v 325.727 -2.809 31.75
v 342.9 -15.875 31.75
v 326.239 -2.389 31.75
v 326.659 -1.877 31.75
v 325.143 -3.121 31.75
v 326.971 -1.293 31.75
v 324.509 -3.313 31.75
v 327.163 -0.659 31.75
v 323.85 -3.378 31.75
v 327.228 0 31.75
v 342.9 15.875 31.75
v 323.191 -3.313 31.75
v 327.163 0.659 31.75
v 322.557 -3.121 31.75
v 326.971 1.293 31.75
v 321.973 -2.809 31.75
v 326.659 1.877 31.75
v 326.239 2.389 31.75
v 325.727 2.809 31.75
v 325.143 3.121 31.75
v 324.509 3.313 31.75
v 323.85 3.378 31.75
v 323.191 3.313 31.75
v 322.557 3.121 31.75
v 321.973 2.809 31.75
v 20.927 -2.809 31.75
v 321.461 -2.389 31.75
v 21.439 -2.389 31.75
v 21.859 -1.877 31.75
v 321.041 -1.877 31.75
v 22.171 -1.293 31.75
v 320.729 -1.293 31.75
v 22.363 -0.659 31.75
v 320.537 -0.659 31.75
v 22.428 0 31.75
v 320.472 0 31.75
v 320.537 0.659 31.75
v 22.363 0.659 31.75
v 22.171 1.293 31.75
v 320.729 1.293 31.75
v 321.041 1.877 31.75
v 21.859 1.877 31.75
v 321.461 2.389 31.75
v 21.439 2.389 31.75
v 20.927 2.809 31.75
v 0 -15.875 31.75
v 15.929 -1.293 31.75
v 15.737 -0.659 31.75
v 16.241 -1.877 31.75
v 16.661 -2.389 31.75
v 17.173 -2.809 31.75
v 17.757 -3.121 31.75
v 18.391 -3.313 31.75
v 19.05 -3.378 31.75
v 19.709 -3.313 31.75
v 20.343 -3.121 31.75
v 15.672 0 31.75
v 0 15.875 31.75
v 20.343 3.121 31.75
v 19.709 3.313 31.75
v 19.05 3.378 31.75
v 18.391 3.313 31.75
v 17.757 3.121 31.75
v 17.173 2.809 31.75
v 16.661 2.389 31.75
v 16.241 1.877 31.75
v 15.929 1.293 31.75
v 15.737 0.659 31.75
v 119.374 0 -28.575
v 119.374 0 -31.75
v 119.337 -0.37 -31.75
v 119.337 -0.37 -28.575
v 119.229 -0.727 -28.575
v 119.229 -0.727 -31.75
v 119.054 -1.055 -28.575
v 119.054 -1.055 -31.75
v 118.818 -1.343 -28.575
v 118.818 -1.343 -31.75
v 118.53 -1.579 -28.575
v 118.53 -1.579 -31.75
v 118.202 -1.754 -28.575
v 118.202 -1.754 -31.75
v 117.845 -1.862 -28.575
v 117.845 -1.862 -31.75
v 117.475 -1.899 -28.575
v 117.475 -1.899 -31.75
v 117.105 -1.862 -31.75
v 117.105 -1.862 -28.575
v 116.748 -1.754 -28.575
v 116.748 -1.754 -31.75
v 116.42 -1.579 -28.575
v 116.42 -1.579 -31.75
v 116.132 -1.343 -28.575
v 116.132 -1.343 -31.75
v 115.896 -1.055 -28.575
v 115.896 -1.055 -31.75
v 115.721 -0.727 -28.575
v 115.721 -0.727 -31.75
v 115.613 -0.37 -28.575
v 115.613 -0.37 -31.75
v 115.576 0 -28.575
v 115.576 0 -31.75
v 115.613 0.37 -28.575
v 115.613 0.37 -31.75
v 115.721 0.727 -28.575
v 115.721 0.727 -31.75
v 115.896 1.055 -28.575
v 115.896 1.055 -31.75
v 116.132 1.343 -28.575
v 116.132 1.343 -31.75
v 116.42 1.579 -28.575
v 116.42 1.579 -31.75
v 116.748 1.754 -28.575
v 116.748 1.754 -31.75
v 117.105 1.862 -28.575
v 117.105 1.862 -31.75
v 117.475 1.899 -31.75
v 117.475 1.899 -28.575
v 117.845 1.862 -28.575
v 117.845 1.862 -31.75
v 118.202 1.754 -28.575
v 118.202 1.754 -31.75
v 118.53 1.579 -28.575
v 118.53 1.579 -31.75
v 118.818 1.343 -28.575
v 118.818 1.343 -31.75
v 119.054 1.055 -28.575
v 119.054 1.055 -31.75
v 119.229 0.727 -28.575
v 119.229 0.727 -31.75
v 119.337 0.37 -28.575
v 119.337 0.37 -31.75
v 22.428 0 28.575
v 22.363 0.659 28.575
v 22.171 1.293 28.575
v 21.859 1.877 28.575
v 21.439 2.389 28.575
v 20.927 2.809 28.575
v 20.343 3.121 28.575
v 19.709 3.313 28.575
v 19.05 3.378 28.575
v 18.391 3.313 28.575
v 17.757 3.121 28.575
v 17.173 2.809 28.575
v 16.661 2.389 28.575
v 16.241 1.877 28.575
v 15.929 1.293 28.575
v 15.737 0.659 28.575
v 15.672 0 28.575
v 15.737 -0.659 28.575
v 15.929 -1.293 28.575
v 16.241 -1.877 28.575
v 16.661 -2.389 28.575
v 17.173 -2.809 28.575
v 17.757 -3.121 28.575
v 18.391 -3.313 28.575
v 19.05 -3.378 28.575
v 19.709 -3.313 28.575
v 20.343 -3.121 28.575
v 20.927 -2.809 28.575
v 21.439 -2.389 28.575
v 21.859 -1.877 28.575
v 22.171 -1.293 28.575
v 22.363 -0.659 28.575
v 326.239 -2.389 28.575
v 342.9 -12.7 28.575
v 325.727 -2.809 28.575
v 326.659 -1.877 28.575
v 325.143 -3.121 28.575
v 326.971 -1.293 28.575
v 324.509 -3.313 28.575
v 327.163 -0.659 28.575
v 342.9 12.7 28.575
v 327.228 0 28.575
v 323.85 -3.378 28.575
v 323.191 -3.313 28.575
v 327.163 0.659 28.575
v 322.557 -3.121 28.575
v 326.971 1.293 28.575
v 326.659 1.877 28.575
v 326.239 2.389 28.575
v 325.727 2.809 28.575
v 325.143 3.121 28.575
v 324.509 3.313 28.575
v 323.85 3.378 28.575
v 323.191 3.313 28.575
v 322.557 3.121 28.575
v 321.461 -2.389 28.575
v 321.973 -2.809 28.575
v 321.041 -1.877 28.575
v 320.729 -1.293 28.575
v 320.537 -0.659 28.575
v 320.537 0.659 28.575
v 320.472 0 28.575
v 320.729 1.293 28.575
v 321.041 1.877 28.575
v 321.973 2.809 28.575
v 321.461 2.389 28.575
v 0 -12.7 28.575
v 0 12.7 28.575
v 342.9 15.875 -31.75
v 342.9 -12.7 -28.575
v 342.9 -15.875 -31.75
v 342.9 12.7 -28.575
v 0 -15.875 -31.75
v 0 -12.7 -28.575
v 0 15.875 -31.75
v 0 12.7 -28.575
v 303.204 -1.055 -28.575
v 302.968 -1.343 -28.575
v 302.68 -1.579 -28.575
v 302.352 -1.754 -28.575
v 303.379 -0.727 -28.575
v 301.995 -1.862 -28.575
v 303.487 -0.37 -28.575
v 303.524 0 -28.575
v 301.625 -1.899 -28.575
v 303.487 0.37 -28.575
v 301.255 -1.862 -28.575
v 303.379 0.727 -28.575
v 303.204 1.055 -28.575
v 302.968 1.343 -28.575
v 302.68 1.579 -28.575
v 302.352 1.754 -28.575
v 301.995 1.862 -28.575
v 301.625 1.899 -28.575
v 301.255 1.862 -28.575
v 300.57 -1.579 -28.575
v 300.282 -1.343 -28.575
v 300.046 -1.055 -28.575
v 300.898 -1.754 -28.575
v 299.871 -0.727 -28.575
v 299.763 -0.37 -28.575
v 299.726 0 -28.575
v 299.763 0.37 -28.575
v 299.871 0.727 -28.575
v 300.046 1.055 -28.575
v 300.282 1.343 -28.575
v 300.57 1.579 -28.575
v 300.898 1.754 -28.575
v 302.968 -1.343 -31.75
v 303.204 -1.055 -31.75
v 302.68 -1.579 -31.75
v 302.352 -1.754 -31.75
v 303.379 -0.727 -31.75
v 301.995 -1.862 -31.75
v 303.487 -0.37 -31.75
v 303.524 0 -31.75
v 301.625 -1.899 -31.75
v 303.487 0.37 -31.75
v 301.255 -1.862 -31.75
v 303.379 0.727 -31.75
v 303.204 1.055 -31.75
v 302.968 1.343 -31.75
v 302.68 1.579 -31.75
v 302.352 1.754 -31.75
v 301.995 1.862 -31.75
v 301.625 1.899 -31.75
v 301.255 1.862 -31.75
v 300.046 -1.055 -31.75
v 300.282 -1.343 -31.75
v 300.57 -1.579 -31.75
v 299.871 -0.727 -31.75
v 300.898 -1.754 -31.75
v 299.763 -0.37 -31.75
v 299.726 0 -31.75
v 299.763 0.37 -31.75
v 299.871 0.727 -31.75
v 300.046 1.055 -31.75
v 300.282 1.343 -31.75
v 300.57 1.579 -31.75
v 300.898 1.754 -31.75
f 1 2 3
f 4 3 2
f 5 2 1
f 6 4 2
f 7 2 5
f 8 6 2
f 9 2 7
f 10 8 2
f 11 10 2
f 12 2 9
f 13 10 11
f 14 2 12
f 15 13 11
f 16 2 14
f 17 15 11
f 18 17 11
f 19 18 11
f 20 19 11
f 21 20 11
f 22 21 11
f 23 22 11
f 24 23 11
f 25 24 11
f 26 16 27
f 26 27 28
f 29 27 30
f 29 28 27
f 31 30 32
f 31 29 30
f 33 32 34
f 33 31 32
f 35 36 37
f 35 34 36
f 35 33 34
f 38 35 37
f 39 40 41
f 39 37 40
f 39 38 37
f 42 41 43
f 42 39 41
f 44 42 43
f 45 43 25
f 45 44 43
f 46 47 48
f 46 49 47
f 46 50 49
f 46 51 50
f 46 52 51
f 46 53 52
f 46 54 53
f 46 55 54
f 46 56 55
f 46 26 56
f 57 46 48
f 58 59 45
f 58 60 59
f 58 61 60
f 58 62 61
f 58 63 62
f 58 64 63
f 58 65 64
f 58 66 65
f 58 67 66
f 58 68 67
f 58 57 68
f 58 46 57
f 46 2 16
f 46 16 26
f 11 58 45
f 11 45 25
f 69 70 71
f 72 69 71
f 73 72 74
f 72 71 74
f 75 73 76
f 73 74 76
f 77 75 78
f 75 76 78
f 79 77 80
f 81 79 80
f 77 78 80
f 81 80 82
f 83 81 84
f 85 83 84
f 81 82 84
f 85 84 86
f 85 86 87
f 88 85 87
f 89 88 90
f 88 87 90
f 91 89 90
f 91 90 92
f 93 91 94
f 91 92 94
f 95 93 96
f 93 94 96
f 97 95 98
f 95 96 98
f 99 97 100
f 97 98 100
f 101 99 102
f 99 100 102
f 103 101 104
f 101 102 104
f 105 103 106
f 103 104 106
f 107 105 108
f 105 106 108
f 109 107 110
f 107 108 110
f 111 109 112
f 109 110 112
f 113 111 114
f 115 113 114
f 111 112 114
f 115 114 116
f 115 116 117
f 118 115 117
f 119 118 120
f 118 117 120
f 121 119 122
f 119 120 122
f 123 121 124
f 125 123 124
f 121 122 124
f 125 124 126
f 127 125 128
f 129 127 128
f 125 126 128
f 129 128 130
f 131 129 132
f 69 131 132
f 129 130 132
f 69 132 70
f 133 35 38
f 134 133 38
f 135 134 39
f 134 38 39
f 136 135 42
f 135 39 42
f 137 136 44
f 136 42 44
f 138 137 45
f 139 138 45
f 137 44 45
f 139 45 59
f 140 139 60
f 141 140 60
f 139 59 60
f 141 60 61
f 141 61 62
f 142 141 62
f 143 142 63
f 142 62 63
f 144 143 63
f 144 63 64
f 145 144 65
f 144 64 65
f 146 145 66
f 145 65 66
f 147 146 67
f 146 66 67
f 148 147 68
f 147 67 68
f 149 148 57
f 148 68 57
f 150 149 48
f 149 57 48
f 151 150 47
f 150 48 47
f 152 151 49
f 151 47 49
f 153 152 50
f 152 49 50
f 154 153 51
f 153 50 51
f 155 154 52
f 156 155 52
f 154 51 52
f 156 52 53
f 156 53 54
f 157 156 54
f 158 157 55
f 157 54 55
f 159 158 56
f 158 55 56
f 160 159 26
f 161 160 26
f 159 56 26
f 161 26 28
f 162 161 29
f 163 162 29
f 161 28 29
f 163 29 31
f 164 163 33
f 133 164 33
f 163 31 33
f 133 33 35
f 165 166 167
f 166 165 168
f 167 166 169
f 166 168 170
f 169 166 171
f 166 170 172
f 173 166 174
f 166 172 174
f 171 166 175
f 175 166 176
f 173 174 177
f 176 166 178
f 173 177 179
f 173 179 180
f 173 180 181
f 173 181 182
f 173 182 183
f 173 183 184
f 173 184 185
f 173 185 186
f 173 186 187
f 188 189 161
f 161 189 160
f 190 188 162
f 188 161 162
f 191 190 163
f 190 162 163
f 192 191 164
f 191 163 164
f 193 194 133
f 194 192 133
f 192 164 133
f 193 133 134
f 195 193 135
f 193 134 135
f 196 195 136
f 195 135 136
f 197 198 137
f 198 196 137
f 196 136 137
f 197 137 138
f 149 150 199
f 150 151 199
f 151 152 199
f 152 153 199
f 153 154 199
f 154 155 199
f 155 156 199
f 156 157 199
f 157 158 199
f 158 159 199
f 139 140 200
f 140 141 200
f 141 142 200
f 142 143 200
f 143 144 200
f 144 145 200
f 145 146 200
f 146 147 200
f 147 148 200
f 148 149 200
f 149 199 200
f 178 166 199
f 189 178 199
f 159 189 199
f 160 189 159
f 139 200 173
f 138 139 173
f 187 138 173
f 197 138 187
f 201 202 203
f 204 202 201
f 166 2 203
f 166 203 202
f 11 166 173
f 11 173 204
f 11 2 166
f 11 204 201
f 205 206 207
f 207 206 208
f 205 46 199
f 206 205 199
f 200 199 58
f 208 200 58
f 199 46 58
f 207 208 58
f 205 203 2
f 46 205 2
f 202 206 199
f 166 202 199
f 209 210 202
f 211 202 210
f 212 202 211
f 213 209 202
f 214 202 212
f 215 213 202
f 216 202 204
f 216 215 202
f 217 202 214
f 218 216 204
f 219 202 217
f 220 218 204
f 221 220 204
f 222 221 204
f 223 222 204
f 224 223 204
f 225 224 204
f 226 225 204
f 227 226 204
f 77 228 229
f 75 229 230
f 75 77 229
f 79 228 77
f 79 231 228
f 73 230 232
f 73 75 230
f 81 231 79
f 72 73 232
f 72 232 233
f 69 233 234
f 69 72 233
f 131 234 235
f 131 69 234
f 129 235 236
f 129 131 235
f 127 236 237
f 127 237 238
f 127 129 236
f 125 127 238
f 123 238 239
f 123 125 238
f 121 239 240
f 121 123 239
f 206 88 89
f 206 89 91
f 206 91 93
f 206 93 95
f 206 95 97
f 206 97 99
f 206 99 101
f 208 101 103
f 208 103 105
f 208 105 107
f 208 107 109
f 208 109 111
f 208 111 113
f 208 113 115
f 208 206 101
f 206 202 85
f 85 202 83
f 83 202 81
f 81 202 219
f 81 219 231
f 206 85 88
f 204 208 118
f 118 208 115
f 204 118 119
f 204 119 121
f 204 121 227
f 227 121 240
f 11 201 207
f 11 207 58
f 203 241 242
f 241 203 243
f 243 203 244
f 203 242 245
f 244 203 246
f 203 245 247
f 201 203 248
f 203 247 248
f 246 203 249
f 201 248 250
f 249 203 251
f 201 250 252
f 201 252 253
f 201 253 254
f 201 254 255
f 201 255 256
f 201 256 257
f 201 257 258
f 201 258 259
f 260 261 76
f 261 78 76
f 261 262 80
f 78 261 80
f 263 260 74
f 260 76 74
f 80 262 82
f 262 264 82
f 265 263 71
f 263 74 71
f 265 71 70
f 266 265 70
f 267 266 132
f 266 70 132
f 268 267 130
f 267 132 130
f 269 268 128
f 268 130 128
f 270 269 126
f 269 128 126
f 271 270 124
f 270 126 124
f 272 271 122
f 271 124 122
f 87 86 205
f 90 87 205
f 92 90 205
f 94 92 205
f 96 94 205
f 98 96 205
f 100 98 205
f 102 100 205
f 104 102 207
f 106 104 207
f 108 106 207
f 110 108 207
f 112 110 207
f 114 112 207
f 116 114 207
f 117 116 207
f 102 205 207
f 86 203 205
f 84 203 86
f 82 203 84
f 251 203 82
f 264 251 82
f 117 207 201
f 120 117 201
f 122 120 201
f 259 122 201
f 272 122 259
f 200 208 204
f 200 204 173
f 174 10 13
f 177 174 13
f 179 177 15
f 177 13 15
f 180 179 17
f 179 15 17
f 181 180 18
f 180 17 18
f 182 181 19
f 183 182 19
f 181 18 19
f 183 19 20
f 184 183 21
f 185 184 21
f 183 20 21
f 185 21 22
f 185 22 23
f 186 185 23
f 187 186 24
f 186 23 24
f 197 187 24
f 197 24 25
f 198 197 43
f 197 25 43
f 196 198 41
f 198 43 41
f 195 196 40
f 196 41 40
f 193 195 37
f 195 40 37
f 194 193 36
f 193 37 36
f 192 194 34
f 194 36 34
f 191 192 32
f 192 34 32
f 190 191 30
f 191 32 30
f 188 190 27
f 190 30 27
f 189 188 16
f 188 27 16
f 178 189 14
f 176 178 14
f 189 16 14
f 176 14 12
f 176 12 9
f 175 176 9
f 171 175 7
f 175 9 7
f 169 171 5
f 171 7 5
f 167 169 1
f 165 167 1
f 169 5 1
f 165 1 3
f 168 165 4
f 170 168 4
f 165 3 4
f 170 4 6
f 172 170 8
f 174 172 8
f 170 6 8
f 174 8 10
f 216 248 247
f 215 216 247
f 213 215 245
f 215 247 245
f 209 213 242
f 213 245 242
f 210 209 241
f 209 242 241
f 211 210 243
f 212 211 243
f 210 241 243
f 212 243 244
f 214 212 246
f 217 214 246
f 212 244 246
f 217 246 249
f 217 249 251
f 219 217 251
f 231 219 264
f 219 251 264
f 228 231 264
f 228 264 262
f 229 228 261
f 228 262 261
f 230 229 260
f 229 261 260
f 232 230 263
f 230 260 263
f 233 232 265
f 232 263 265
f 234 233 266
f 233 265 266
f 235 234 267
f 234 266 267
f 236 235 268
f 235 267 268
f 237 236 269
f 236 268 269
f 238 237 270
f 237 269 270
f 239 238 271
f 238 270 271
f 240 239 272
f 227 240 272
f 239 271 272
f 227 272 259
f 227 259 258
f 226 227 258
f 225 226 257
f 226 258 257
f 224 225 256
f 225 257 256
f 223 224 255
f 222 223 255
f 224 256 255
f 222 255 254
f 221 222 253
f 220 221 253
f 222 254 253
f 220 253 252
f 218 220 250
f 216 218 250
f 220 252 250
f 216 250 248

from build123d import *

# Parameters (mm, degrees)
F0_W     = 31.75
F0_H     = 63.5
F0_W_2   = 25.4
F0_H_2   = 57.15
F1_DEPTH = 342.9
F2_R     = 1.89865
F3_DEPTH = 3.175
F4_R     = 3.3782
F5_DEPTH = 3.175


with BuildPart() as f1:
    # F0 (on Right) → F1 (new body)
    with BuildSketch(Plane.YZ):
        Rectangle(F0_W, F0_H)
        Rectangle(F0_W_2, F0_H_2, mode=Mode.SUBTRACT)
    extrude(amount=F1_DEPTH)

    # F2 (on face) → F3 (cut, through all)
    with BuildSketch(Plane(origin=(0, 0, -31.75), x_dir=(1, 0, 0), z_dir=(0, 0, -1))):
        with Locations((117.475, 0)):
            Circle(F2_R)
        with Locations((301.625, 0)):
            Circle(F2_R)
    extrude(amount=-F3_DEPTH, mode=Mode.SUBTRACT)

    # F4 (on face) → F5 (cut, through all)
    with BuildSketch(Plane.XY.offset(31.75)):
        with Locations((19.05, 0)):
            Circle(F4_R)
        with Locations((323.85, 0)):
            Circle(F4_R)
    extrude(amount=-F5_DEPTH, mode=Mode.SUBTRACT)


solid = f1.part
